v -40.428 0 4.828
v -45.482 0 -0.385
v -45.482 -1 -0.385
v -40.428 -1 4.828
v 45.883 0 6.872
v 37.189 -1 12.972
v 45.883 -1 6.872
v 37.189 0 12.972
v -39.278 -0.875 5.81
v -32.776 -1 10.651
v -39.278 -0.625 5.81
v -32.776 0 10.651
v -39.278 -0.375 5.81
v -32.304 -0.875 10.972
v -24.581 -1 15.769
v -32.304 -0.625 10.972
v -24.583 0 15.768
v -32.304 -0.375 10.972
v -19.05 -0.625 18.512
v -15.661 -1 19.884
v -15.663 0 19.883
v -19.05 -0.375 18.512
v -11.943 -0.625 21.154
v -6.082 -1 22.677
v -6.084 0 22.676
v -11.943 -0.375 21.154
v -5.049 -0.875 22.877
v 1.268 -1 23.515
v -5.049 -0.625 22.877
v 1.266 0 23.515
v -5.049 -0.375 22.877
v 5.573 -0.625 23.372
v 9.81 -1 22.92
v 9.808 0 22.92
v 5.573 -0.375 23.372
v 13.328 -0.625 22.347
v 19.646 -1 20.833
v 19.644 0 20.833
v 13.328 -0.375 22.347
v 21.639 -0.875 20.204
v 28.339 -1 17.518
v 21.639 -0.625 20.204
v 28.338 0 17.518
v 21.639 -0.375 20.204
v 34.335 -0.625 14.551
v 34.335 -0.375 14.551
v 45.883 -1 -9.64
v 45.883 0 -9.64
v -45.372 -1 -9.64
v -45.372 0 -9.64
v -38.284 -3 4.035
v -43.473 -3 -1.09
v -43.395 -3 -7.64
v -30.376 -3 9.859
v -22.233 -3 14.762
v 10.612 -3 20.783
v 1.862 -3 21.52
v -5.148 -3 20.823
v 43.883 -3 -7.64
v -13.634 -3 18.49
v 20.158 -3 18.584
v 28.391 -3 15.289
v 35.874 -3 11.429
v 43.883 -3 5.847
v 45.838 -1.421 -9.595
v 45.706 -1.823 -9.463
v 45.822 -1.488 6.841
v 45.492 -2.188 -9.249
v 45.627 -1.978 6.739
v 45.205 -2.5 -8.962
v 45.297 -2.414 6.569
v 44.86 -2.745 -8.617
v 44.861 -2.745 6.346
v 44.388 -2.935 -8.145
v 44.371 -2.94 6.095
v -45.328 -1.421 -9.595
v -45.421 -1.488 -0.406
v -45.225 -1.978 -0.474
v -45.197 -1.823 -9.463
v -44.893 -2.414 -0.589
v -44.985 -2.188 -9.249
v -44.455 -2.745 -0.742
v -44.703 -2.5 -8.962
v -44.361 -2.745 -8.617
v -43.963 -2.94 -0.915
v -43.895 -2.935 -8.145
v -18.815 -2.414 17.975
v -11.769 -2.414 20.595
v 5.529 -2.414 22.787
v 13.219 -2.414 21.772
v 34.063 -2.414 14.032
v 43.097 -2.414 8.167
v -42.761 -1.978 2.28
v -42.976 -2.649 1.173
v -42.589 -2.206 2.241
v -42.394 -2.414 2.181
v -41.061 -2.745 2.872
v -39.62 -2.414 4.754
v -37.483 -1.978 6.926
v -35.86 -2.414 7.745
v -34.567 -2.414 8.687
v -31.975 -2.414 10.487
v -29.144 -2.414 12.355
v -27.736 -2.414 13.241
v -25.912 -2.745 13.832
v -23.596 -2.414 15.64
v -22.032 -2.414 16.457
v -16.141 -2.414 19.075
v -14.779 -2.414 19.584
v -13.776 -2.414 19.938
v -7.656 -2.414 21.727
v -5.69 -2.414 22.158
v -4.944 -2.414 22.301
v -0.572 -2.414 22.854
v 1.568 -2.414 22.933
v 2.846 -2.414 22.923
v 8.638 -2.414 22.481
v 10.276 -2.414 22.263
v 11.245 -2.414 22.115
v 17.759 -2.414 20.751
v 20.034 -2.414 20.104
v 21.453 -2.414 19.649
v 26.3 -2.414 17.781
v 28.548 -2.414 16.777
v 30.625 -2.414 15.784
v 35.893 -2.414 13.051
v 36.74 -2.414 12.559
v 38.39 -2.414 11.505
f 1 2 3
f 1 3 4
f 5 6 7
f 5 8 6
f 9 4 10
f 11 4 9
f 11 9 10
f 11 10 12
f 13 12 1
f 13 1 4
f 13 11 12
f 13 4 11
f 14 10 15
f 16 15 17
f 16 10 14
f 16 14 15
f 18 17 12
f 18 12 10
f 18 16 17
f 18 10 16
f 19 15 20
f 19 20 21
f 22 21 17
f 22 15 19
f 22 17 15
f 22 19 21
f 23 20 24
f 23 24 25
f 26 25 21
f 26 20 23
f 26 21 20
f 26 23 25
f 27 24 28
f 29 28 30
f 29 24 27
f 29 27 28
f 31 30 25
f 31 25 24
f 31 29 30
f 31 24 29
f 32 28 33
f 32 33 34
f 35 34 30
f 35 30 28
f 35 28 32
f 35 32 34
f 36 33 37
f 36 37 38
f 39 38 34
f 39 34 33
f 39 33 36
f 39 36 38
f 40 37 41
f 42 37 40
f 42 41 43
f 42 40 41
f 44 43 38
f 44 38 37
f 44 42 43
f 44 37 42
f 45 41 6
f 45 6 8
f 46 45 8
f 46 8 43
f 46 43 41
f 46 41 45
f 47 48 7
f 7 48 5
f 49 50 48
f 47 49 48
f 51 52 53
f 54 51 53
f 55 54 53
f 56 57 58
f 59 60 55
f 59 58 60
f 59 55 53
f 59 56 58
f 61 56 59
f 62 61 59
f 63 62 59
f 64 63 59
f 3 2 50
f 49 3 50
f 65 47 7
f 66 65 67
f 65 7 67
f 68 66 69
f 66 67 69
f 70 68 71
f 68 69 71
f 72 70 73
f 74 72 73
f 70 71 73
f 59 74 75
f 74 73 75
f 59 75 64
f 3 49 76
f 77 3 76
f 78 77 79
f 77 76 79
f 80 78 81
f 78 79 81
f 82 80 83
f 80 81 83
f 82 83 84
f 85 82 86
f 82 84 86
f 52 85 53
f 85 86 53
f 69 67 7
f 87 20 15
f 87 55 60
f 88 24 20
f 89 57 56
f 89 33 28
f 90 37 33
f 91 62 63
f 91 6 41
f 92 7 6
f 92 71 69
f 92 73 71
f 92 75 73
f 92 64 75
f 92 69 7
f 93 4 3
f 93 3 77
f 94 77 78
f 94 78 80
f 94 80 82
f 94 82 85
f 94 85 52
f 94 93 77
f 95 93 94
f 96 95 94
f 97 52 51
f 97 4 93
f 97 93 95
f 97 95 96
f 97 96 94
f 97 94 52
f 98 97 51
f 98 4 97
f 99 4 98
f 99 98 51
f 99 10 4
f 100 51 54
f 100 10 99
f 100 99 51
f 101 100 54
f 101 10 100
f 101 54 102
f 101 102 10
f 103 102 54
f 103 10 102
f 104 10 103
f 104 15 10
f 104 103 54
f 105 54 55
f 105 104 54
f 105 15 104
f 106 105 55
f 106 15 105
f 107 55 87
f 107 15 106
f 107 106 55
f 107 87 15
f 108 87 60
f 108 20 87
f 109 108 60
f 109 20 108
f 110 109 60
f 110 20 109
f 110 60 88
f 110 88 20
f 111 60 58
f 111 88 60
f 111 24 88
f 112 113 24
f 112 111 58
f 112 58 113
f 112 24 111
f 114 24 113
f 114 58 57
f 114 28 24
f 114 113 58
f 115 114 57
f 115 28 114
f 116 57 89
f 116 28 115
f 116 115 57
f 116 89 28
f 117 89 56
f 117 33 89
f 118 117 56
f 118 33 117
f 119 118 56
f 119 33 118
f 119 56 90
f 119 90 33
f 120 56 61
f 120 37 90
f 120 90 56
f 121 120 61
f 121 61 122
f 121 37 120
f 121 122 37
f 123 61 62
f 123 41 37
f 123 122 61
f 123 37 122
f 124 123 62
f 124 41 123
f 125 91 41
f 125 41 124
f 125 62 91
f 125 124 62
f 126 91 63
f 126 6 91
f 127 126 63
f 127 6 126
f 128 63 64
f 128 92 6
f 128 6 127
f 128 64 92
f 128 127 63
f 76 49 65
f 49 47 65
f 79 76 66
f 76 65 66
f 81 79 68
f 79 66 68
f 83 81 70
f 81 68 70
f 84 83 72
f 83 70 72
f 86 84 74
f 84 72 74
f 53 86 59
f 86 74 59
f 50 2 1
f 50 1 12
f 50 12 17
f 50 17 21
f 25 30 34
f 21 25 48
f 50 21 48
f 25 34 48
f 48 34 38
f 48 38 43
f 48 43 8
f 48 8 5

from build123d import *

# Parameters (mm, degrees)
F1_DEPTH = 3
F2_R     = 2


with BuildPart() as f1:
    # F0 (on Front) → F1 (new body)
    with BuildSketch(Plane.XZ):
        with BuildLine():
            Line((-45.4815110888, -0.3848903712), (-45.3719524288, -9.6397625337))
            Line((-45.3719524288, -9.6397625337), (45.882790834, -9.6397625337))
            Line((45.882790834, -9.6397625337), (45.882790834, 6.8723438843))
            add(Edge.make_bspline(
                [(-45.4815110888, -0.3848903712), (-41.8417168354, 4.1542411246), (-32.4115512404, 11.2348853063), (-19.6311352295, 18.9335833872), (-5.0384715674, 23.419081985), (5.6209472315, 23.7940507645), (21.5214061349, 21.1618756859), (34.6792711043, 14.3995509583), (38.3398564941, 12.4209440506), (45.327889945, 7.2540018263), (45.882790834, 6.8723438843)],
                knots=[0, 0, 0, 0, 0.1476961923, 0.2859700745, 0.421579933, 0.5370508235, 0.6803489558, 0.8123561449, 0.9014115871, 0.9837228536, 0.9837228536, 0.9837228536, 0.9837228536], degree=3))
        make_face()
    extrude(amount=F1_DEPTH)

    # F2
    f2_edges = [f1.edges().sort_by_distance(p)[0] for p in [
        (-1.359729, -3, 23.380607),
        (-45.426732, -3, -5.012326),
        (0.255419, -3, -9.639763),
        (45.882791, -3, -1.383709),
    ]]
    fillet(f2_edges, radius=F2_R)


solid = f1.part
